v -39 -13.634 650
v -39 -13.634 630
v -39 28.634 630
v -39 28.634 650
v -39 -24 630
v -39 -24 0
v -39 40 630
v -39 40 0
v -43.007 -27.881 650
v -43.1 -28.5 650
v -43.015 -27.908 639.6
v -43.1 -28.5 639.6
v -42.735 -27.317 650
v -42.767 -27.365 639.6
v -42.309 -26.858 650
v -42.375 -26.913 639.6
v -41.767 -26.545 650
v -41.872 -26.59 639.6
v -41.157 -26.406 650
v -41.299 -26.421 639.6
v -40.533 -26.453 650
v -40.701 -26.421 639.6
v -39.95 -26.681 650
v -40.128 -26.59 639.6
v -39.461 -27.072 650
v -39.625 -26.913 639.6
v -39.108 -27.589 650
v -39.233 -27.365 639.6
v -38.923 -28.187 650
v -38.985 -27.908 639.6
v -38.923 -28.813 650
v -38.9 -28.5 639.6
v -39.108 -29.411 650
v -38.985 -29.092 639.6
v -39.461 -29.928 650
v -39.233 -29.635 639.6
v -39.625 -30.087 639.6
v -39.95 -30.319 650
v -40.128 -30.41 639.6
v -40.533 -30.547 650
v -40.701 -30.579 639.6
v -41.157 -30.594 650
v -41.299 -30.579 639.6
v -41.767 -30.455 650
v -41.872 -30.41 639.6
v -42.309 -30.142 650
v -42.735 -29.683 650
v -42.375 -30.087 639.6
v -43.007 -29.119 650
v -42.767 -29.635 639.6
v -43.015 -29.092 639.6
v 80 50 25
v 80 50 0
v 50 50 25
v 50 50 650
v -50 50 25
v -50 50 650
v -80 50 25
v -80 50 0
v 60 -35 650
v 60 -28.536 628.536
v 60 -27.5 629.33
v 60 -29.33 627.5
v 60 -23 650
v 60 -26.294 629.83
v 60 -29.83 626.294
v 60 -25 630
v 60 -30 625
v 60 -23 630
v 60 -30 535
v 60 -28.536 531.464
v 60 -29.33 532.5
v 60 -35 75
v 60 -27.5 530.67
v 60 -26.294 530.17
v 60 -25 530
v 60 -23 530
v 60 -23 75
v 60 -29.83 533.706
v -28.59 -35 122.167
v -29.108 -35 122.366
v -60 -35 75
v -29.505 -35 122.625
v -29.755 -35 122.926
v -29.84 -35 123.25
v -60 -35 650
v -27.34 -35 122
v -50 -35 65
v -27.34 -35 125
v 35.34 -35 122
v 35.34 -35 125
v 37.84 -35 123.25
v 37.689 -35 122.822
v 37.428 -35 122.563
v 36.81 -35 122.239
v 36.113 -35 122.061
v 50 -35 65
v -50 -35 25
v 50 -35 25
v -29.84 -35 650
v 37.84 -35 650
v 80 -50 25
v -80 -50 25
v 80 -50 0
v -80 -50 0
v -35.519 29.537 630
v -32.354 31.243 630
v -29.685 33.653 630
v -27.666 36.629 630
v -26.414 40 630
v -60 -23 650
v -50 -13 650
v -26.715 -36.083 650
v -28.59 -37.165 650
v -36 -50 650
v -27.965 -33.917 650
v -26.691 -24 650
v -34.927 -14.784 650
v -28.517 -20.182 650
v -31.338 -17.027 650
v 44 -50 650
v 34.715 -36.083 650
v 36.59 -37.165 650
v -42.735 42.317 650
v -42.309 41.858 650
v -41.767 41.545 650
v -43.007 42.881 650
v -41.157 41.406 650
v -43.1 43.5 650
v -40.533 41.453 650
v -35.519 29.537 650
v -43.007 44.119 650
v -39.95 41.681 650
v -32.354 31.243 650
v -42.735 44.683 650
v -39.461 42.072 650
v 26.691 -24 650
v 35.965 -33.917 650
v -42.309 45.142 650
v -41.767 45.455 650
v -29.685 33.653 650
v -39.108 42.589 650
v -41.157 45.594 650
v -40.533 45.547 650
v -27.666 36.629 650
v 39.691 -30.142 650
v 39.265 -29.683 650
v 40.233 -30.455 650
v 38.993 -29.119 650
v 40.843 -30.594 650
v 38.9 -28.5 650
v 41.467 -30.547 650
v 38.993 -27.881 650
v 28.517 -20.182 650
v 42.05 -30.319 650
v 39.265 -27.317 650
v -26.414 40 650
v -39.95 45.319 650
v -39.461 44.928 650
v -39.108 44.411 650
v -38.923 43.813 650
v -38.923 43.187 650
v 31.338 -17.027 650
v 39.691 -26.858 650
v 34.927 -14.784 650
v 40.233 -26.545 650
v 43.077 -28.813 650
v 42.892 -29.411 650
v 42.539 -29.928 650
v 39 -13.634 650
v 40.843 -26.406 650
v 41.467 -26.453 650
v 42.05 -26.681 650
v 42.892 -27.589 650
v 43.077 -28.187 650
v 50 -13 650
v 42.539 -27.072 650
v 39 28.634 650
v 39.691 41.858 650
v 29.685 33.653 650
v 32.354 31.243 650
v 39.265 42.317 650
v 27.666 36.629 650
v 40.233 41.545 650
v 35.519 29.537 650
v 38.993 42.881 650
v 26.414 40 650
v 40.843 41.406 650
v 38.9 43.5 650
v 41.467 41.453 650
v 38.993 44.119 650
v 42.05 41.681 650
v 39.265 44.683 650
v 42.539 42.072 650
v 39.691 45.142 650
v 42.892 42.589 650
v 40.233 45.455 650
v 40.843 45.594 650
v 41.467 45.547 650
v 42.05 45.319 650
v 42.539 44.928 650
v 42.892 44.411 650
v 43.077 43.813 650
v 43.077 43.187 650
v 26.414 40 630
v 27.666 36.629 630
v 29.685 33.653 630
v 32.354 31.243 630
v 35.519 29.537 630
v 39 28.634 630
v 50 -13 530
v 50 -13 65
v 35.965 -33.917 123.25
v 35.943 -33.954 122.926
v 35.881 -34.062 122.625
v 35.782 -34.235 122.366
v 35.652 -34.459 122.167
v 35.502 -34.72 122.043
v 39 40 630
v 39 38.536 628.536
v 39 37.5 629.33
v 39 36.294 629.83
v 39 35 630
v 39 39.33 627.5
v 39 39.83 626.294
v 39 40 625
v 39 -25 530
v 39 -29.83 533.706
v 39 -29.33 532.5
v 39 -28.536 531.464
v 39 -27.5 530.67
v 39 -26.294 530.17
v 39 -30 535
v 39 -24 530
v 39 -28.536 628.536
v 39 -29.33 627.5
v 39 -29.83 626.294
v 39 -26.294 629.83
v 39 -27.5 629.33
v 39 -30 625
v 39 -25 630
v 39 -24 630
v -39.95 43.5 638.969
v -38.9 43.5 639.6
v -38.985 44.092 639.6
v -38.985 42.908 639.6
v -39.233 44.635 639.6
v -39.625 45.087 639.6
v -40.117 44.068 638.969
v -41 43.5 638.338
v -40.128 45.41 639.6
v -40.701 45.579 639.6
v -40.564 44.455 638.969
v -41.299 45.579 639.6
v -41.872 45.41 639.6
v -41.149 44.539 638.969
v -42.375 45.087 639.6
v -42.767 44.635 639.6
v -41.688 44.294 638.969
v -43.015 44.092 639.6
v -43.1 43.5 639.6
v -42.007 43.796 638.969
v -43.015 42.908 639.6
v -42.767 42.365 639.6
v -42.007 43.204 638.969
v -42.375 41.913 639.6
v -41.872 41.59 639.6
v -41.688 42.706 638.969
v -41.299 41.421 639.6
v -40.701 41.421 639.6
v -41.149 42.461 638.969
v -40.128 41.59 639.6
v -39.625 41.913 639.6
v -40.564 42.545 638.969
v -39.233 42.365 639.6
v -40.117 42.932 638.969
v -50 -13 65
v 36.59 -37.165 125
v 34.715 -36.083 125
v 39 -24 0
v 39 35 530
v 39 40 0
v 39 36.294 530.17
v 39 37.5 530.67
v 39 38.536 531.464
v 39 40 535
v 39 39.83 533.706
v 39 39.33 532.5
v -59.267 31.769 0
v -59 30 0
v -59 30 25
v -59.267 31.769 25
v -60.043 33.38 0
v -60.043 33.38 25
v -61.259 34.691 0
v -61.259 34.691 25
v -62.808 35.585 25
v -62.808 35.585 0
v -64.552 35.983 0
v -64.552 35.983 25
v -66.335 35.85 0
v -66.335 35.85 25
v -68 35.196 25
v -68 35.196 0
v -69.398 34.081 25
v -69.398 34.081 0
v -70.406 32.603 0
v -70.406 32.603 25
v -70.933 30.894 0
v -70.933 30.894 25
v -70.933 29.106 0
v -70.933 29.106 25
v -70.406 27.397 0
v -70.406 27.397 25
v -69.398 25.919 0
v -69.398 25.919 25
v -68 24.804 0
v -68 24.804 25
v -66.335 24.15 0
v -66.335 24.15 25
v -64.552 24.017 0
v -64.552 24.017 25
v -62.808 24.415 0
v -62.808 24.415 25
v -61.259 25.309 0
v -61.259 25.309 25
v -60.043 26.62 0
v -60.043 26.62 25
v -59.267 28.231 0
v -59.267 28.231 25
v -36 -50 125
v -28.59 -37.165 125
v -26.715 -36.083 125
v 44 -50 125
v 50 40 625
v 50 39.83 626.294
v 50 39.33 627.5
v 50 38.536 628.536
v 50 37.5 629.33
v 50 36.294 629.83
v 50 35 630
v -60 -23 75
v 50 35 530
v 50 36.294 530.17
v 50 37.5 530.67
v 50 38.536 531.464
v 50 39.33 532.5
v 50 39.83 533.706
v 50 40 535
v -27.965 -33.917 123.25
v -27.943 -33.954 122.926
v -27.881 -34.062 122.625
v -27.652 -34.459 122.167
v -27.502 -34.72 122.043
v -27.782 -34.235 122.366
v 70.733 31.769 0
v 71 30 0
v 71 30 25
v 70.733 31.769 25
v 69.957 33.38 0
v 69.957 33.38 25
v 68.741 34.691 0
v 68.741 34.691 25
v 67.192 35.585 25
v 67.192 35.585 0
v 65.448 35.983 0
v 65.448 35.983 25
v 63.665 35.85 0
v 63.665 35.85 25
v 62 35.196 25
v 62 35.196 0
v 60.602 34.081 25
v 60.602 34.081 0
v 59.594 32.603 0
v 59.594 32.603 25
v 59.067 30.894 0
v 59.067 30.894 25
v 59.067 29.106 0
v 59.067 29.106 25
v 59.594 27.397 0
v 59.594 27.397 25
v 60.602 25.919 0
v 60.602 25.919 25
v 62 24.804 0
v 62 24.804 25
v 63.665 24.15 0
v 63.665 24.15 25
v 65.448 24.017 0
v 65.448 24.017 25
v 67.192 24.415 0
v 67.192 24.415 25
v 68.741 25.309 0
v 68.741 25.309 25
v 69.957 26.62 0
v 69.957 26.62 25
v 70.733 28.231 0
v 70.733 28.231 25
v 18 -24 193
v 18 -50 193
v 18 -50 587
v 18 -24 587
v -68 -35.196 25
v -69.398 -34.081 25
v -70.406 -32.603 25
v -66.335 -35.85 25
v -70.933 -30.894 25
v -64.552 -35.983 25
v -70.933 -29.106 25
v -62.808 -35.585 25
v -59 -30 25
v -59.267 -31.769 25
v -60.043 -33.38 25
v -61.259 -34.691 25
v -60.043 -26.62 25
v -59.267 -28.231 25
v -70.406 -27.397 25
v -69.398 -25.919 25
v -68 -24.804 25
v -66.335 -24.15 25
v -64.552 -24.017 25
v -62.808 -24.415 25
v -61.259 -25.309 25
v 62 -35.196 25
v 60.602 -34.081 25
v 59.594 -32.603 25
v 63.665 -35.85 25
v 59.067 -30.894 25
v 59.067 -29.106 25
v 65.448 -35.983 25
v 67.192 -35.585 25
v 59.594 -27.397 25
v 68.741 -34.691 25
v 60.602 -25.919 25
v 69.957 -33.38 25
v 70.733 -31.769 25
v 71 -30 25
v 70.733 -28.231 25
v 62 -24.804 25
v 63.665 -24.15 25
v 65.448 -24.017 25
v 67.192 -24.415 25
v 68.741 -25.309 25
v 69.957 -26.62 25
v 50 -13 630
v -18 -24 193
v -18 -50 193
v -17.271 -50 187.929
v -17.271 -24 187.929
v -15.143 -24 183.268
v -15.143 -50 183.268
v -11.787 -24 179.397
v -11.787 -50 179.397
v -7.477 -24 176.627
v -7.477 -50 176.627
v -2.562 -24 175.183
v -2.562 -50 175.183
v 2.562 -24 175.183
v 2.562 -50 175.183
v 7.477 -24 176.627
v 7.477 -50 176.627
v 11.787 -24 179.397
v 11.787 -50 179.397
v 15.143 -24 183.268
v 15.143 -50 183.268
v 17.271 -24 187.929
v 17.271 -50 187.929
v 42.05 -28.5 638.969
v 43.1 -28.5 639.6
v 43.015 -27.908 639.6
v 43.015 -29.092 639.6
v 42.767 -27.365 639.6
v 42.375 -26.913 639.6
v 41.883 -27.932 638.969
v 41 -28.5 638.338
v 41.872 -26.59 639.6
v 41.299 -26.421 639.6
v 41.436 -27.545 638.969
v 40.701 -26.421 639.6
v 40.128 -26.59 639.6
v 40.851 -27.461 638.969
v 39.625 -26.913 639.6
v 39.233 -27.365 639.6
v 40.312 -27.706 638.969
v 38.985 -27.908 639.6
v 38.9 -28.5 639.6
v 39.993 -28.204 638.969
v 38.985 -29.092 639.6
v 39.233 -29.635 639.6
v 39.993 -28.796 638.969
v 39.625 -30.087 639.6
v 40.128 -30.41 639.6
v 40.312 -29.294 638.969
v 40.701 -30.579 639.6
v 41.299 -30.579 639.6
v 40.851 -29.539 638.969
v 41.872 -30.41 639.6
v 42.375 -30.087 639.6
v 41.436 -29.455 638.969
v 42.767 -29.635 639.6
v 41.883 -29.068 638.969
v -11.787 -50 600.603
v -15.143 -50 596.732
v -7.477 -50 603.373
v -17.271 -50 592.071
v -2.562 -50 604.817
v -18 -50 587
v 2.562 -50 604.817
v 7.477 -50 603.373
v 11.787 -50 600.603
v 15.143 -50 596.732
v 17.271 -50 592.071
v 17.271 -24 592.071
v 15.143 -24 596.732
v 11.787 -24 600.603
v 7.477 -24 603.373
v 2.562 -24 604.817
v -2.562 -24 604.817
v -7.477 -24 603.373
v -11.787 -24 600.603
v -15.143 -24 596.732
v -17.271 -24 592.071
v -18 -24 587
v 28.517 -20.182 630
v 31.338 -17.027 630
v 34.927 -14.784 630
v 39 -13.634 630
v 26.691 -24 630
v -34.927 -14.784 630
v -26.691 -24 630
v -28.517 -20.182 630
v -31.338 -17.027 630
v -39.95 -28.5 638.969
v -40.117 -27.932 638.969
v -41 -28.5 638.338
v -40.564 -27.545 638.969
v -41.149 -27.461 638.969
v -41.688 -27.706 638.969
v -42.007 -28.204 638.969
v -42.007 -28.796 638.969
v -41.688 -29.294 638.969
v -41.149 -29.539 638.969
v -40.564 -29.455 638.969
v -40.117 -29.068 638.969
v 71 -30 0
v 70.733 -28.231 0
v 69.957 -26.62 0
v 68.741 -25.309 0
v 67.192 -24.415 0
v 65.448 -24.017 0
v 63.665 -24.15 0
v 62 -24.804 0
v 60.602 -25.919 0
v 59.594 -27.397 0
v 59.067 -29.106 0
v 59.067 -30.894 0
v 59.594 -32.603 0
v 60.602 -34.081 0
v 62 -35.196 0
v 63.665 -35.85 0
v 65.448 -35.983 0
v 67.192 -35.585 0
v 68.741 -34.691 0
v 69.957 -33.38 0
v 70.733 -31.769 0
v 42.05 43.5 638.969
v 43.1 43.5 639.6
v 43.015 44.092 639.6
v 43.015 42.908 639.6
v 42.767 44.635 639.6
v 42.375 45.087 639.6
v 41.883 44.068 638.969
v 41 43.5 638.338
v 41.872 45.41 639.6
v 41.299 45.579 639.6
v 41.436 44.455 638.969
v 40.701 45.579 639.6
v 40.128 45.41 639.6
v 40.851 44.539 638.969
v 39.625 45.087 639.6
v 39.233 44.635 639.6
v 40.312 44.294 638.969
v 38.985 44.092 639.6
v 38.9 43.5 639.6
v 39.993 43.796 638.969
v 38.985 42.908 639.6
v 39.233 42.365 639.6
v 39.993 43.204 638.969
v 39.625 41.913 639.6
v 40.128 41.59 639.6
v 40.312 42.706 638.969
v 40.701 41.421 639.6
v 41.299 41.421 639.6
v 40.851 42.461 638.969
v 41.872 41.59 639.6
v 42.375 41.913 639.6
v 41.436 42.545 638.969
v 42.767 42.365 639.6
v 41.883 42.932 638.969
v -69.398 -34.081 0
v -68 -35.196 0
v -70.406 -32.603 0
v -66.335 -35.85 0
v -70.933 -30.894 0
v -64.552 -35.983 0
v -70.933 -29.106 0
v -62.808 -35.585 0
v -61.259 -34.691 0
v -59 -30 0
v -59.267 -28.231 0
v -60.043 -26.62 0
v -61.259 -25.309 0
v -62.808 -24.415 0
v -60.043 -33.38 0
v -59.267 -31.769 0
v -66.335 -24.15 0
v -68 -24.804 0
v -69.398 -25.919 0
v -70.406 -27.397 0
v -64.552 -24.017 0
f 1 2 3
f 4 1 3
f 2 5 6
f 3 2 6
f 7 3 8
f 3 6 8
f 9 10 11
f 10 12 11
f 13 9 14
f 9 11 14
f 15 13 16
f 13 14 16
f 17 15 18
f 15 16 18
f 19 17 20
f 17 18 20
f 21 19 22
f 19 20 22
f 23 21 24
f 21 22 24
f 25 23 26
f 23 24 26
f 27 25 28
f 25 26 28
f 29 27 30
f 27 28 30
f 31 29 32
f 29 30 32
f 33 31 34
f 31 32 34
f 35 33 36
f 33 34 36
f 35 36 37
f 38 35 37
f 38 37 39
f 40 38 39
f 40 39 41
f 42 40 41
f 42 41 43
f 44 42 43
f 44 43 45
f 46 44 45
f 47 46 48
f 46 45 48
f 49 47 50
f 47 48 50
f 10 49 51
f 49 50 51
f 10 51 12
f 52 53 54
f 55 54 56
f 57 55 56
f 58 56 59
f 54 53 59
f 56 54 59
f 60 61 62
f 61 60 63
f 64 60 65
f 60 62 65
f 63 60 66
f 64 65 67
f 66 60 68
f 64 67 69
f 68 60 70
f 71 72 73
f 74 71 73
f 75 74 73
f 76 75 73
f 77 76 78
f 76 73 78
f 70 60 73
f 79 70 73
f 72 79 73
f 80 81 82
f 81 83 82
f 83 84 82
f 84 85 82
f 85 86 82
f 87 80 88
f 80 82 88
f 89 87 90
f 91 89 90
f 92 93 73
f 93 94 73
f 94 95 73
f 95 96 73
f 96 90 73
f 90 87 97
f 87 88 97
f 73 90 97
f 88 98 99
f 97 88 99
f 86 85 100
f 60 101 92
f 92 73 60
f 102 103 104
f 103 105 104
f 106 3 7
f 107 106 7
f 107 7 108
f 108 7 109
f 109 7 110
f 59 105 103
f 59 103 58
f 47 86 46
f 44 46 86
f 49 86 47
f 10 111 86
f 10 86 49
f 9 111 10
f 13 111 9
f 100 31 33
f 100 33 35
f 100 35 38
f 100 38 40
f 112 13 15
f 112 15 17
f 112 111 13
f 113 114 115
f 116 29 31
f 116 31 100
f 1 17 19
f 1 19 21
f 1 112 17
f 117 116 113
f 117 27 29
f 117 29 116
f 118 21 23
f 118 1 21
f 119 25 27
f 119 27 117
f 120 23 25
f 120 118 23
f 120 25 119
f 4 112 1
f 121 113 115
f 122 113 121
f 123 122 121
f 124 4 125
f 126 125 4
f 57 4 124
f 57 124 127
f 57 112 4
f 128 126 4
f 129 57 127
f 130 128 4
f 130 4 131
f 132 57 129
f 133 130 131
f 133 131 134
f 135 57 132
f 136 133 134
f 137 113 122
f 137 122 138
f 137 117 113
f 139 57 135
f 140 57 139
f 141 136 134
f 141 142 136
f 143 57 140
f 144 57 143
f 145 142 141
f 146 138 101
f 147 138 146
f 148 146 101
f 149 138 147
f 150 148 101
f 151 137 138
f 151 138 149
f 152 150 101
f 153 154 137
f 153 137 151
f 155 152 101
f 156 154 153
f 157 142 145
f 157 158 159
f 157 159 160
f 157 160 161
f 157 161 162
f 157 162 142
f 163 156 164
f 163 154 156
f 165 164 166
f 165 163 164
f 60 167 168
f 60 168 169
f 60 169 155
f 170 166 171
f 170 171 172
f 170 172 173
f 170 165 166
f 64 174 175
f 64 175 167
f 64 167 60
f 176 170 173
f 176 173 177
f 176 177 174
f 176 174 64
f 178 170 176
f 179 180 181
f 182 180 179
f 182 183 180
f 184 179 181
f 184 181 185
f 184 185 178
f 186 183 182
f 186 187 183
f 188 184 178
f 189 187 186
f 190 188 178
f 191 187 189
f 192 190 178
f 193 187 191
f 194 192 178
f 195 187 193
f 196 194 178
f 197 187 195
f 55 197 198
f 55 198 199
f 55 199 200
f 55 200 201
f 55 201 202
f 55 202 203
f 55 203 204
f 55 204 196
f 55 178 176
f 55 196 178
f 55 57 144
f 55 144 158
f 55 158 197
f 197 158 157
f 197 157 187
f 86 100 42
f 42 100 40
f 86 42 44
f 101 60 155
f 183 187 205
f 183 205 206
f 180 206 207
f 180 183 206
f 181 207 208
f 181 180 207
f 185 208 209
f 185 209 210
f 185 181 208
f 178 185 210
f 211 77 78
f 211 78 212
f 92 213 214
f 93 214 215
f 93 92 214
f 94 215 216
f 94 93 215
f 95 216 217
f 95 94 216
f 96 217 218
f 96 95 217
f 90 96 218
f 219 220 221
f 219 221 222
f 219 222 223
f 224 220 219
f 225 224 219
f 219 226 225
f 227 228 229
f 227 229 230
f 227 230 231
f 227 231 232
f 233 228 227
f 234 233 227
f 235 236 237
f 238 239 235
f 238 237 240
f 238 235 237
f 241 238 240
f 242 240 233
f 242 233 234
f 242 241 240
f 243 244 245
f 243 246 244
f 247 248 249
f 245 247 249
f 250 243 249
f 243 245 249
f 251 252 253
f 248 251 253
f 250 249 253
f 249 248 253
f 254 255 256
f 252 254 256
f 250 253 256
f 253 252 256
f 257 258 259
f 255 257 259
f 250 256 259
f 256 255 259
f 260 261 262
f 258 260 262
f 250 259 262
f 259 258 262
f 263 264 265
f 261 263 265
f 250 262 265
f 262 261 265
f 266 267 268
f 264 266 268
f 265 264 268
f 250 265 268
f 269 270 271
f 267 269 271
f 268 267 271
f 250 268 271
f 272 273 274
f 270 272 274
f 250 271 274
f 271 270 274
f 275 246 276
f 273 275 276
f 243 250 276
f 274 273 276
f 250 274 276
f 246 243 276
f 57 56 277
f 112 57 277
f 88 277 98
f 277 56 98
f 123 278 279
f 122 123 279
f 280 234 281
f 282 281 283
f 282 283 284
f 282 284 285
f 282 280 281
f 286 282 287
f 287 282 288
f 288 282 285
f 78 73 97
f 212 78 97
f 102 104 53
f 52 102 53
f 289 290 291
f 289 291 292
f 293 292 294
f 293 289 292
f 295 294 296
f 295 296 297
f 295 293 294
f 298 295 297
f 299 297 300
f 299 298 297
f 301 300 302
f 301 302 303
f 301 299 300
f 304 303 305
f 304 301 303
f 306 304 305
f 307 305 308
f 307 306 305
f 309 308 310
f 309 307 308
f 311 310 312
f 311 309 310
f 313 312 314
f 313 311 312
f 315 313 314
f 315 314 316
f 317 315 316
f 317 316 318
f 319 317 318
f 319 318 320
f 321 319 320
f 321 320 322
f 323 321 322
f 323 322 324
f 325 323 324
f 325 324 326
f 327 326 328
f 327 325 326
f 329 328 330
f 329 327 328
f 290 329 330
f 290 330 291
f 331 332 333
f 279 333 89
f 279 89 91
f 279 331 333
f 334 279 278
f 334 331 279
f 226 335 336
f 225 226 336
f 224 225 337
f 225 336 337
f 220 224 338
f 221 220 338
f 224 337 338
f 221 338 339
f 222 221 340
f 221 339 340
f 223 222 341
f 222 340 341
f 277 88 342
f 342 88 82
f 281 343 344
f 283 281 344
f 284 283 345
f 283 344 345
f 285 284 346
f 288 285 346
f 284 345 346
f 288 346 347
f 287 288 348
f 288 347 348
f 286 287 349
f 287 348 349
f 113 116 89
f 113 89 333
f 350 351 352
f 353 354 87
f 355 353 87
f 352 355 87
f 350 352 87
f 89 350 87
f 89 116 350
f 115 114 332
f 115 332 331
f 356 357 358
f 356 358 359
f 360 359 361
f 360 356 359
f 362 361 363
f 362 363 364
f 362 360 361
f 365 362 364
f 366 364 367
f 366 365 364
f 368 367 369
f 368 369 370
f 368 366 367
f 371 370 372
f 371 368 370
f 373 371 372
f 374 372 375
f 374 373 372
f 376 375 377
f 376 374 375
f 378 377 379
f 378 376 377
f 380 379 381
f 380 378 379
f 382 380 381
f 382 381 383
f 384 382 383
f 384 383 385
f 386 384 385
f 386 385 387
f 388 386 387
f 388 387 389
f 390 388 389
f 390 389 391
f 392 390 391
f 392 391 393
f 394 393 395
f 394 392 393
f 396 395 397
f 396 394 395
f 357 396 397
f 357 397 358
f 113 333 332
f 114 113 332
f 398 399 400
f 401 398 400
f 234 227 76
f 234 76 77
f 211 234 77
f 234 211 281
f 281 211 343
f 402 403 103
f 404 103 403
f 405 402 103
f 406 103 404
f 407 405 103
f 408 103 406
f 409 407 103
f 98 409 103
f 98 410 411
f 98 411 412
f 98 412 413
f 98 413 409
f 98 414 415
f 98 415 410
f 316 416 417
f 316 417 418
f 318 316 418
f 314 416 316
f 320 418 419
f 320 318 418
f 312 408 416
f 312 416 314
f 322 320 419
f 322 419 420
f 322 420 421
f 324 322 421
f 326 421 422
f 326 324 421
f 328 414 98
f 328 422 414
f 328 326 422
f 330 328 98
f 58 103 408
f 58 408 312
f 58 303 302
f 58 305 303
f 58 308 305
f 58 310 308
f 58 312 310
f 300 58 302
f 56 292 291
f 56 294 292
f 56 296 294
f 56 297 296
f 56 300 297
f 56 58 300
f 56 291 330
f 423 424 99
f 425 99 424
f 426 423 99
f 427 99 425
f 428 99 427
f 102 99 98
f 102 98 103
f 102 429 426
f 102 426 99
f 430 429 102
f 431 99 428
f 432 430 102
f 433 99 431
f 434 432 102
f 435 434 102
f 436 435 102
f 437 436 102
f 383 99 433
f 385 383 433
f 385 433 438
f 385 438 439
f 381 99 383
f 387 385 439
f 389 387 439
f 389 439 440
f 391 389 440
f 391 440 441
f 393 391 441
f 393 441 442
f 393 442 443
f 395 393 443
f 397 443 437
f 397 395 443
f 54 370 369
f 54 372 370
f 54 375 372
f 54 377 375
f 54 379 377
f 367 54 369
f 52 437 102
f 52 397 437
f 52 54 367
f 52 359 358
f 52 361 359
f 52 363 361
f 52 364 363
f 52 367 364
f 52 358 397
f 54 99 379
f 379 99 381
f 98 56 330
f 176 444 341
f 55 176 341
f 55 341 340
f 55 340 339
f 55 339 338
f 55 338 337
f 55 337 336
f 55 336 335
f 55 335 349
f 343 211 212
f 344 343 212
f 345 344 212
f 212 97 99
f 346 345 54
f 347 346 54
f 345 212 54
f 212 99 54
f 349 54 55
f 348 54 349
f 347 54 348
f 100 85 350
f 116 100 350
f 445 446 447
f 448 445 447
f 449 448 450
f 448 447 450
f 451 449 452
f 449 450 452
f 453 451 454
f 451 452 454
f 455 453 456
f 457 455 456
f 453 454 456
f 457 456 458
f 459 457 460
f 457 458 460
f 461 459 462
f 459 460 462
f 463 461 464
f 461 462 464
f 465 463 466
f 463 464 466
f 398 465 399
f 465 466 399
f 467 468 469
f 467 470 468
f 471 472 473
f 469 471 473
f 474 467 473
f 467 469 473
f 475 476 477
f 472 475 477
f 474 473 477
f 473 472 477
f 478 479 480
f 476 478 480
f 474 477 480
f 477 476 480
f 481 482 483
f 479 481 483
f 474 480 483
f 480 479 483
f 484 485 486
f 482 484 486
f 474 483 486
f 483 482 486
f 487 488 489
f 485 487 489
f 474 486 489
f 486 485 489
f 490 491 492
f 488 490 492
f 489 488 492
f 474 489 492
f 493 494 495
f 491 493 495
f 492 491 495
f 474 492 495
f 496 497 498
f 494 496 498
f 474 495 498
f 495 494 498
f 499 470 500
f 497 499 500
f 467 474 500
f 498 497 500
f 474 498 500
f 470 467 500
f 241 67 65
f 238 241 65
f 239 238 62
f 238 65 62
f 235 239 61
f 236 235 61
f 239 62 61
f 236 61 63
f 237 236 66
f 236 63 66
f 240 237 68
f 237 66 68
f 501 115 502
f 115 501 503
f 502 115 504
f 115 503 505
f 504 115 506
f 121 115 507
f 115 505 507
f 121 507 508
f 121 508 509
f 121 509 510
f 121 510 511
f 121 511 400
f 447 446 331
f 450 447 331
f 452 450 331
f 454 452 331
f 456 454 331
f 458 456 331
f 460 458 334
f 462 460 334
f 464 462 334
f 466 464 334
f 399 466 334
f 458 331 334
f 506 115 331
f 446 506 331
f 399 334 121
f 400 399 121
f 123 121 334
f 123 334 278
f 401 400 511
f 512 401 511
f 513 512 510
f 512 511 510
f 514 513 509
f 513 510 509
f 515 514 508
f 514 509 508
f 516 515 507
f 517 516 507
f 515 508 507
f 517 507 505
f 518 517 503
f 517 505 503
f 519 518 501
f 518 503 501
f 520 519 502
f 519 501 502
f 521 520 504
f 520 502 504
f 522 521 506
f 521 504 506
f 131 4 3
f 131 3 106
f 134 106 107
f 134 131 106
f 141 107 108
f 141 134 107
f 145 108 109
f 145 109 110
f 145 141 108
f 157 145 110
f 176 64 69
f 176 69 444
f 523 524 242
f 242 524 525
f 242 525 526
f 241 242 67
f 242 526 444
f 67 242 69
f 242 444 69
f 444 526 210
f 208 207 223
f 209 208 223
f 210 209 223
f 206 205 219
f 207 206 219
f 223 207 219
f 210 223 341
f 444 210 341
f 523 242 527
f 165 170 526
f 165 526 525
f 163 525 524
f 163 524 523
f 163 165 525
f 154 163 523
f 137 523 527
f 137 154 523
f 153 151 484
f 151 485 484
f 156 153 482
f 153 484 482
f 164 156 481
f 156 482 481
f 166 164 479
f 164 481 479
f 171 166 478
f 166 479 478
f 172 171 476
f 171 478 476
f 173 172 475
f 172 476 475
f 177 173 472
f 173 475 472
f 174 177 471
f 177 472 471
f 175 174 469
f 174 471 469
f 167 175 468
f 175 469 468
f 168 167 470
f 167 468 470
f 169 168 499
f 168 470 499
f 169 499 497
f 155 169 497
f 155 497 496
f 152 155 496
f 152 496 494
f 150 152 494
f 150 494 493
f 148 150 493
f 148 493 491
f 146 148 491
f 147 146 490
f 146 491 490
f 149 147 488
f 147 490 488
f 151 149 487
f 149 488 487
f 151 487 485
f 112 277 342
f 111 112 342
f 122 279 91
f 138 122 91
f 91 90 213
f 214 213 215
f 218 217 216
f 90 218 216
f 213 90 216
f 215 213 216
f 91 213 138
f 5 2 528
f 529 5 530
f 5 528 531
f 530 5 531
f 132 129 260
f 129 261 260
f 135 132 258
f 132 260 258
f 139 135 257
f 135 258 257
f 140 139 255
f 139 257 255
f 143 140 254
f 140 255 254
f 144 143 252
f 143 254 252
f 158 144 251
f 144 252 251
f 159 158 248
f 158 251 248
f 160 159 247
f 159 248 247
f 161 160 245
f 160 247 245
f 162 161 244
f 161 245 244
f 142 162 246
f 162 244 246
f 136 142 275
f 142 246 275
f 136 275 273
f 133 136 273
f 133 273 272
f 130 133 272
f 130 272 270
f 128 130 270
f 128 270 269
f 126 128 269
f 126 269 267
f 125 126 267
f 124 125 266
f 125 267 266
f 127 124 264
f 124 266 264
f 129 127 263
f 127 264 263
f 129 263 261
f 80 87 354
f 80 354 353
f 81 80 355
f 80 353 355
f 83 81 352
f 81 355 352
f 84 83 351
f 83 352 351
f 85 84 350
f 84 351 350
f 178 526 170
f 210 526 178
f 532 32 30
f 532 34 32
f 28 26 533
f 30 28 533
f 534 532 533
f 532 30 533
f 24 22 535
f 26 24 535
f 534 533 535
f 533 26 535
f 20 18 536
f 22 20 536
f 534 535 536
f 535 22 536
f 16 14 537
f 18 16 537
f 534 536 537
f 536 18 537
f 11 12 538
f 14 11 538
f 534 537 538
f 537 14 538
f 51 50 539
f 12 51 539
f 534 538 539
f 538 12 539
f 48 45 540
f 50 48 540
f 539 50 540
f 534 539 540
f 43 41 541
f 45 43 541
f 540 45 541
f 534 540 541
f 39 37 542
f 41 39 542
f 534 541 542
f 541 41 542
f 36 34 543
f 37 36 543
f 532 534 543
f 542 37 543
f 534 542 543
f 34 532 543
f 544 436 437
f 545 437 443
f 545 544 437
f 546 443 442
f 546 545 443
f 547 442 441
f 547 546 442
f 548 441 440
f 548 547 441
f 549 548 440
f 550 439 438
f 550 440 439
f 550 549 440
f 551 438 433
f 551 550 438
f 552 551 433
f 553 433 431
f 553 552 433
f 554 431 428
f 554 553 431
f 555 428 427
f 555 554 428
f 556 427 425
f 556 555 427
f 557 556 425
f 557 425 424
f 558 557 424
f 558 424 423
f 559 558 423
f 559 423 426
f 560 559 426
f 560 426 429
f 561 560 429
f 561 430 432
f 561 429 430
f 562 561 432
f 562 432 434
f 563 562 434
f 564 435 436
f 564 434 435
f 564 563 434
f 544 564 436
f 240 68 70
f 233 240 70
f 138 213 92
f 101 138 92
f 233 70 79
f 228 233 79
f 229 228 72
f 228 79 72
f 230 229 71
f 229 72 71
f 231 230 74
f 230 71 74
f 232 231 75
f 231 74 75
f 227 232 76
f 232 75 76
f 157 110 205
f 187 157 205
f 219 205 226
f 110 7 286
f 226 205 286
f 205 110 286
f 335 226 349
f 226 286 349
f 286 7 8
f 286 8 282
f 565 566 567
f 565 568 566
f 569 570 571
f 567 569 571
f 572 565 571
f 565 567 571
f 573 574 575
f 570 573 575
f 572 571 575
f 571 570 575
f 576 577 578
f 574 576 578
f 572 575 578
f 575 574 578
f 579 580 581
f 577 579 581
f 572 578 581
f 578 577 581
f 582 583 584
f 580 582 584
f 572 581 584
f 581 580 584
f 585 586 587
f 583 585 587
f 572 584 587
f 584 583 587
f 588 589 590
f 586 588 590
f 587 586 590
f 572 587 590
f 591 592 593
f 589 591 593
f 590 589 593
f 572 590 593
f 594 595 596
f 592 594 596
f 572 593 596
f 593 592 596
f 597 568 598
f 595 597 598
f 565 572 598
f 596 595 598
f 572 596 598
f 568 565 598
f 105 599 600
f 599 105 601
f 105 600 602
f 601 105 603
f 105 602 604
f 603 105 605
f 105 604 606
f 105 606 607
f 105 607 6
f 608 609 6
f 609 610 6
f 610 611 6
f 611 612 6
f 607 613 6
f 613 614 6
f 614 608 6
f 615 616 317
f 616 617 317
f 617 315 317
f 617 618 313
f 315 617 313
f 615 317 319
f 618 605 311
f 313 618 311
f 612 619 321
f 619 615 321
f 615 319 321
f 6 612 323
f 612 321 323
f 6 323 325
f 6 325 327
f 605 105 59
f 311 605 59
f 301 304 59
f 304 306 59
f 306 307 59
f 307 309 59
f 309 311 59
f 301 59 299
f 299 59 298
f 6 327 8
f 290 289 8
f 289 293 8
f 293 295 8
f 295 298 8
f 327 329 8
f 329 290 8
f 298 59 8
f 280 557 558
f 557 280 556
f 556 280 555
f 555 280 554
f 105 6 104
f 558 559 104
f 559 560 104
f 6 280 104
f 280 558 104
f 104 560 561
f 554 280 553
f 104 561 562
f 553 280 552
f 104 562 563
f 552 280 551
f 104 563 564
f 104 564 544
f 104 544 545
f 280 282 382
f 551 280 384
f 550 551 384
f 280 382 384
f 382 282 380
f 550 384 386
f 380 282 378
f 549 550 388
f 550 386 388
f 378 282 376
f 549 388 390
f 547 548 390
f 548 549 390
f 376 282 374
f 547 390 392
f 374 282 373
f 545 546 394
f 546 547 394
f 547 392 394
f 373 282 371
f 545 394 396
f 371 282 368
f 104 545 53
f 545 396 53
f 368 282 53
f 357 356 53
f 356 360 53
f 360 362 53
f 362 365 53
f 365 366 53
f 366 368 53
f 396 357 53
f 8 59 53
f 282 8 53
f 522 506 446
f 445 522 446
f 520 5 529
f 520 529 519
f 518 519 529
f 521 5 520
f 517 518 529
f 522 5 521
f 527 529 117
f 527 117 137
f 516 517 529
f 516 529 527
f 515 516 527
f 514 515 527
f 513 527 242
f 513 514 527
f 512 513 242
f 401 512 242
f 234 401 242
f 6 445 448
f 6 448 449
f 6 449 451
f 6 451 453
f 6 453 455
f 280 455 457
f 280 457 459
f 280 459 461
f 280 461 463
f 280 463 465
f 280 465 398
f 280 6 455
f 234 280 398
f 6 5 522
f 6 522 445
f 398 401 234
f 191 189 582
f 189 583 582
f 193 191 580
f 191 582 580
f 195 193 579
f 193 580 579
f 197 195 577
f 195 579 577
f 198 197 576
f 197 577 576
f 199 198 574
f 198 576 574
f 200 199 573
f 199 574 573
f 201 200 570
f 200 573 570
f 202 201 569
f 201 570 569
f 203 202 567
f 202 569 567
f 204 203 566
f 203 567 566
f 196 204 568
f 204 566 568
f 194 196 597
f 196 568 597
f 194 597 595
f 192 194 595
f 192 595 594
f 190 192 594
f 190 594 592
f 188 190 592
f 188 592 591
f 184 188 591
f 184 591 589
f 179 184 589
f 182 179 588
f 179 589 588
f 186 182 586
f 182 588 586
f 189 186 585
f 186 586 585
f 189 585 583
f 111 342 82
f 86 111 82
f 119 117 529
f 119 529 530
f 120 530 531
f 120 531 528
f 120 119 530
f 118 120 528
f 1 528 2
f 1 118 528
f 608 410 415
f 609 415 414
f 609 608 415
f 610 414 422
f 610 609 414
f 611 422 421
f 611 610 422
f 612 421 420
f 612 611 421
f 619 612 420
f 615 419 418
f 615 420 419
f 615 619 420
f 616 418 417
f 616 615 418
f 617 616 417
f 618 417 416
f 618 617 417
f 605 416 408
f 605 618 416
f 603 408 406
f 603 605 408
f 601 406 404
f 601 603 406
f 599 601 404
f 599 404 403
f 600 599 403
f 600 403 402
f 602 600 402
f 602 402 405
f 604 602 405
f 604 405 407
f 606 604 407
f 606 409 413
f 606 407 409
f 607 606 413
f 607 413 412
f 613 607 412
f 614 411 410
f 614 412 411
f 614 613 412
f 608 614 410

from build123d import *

# Parameters (mm, degrees)
F0_W           = 160
F0_H           = 100
F0_R           = 6
F0_W_2         = 78
F0_H_2         = 64
F1_DEPTH       = 25
F2_W           = 78
F2_H           = 64
F3_DEPTH       = 625
F5_DEPTH       = 26
F6_W           = 80
F6_H           = 100
F7_DEPTH       = 15
F9_DEPTH       = 22
F11_D          = 4.2
F11_DEPTH      = 10.4
F11_TIP        = 1.2618073
F13_DEPTH      = 20
F15_DEPTH      = 21
F17_DEPTH      = 525
F17_DEPTH_BACK = 3
F18_R          = 1.24999


# Not quite as in the source:
# - a fillet or chamfer is up to 0.001 mm smaller than in the source, because OpenCascade refuses the exact size


with BuildPart() as f1:
    # F0 (on Top) → F1 (new body)
    with BuildSketch(Plane.XY):
        Rectangle(F0_W, F0_H)
        with Locations((-65, -30)):
            Circle(F0_R, mode=Mode.SUBTRACT)
        with Locations((65, -30)):
            Circle(F0_R, mode=Mode.SUBTRACT)
        with Locations((-65, 30)):
            Circle(F0_R, mode=Mode.SUBTRACT)
        with Locations((0, 8)):
            Rectangle(F0_W_2, F0_H_2, mode=Mode.SUBTRACT)
        with Locations((65, 30)):
            Circle(F0_R, mode=Mode.SUBTRACT)
    extrude(amount=F1_DEPTH)

    # F2 (on face) → F3 (join)
    with BuildSketch(Plane.XY.offset(25)):
        Polygon((50, 50), (-50, 50), (-50, -13), (-60, -23), (-60, -35), (-27.3397459622, -35), (-36, -50), (44, -50), (35.3397459622, -35), (60, -35), (60, -23), (50, -13), align=None)
        with Locations((0, 8)):
            Rectangle(F2_W, F2_H, mode=Mode.SUBTRACT)
    extrude(amount=F3_DEPTH)

    # F4 (on face) → F5 (cut, through all)
    with BuildSketch(Plane.XZ.offset(50)):
        with BuildLine():
            ThreePointArc((-18, 193), (0, 175), (18, 193))
            Line((18, 193), (18, 587))
            ThreePointArc((18, 587), (0, 605), (-18, 587))
            Line((-18, 587), (-18, 193))
        make_face()
    extrude(amount=-F5_DEPTH, mode=Mode.SUBTRACT)

    # F6 (on face) → F7 (cut, through all)
    with BuildSketch(Plane.XZ.offset(50)):
        with Locations((4, 75)):
            Rectangle(F6_W, F6_H)
    extrude(amount=-F7_DEPTH, mode=Mode.SUBTRACT)

    # F8 (on face) → F9 (cut, through all)
    with BuildSketch(Plane.XZ.offset(35)):
        Polygon((-60, 75), (-60, 25), (-50, 25), (-50, 65), align=None)
        Polygon((50, 65), (50, 25), (60, 25), (60, 75), align=None)
    extrude(amount=-F9_DEPTH, mode=Mode.SUBTRACT)

    # F11
    with Locations(Plane.XY.offset(650)):
        with Locations((-41, 43.5), (41, 43.5), (41, -28.5), (-41, -28.5)):
            Hole(F11_D / 2, depth=F11_DEPTH)
            with Locations((0, 0, -(F11_DEPTH + F11_TIP / 2))):  # 118° drill point
                Cone(0, F11_D / 2, F11_TIP, mode=Mode.SUBTRACT)

    # F12 (on face) → F13 (join)
    with BuildSketch(Plane.XY.offset(650)):
        with BuildLine():
            Line((-39, 40), (-39, 28.6339312527))
            ThreePointArc((-39, 28.6339312527), (-30.9466258481, 32.367629715), (-26.4140478542, 40))
            Line((-26.4140478542, 40), (-39, 40))
        make_face()
        with BuildLine():
            Line((39, 40), (26.4140478542, 40))
            ThreePointArc((26.4140478542, 40), (30.9466258481, 32.367629715), (39, 28.6339312527))
            Line((39, 28.6339312527), (39, 40))
        make_face()
        with BuildLine():
            ThreePointArc((-26.6909119787, -24), (-31.3376797124, -17.0265712771), (-39, -13.6339312527))
            Line((-39, -13.6339312527), (-39, -24))
            Line((-39, -24), (-26.6909119787, -24))
        make_face()
        with BuildLine():
            ThreePointArc((39, -13.6339312527), (31.3376797124, -17.0265712771), (26.6909119787, -24))
            Line((26.6909119787, -24), (39, -24))
            Line((39, -24), (39, -13.6339312527))
        make_face()
    extrude(amount=-F13_DEPTH)

    # F14 (on face) → F15 (cut, through all)
    with BuildSketch(Plane.YZ.offset(60)):
        with BuildLine():
            Line((35, 630), (-23, 630))
            Line((-23, 630), (-23, 530))
            Line((-23, 530), (35, 530))
            ThreePointArc((35, 530), (38.5355339059, 531.4644660941), (40, 535))
            Line((40, 535), (40, 625))
            ThreePointArc((40, 625), (38.5355339059, 628.5355339059), (35, 630))
        make_face()
        with BuildLine():
            Line((-23, 630), (-25, 630))
            ThreePointArc((-25, 630), (-28.5355339059, 628.5355339059), (-30, 625))
            Line((-30, 625), (-30, 535))
            ThreePointArc((-30, 535), (-28.5355339059, 531.4644660941), (-25, 530))
            Line((-25, 530), (-23, 530))
            Line((-23, 530), (-23, 630))
        make_face()
    extrude(amount=-F15_DEPTH, mode=Mode.SUBTRACT)

    # F16 (on face) → F17 (cut, two sides)
    with BuildSketch(Plane(origin=(0, 0, 125), x_dir=(1, 0, 0), z_dir=(0, 0, -1))) as f17_sk:
        Polygon((36.5897459622, 37.1650635095), (34.7147459622, 36.0825317547), (35.9647459622, 33.9174682453), (37.8397459622, 35), align=None)
        Polygon((-27.9647459622, 33.9174682453), (-26.7147459622, 36.0825317547), (-28.5897459622, 37.1650635095), (-29.8397459622, 35), align=None)
    extrude(amount=-F17_DEPTH, mode=Mode.SUBTRACT)
    extrude(f17_sk.sketch, amount=F17_DEPTH_BACK, mode=Mode.SUBTRACT)

    # F18 (radius 1.25 in the source; OpenCascade refuses exactly that, so slightly less here)
    f18_edges = [f1.edges().sort_by_distance(p)[0] for p in [
        (36.902246, -34.458734, 122),
        (-28.902246, -34.458734, 122),
    ]]
    fillet(f18_edges, radius=F18_R)


solid = f1.part
